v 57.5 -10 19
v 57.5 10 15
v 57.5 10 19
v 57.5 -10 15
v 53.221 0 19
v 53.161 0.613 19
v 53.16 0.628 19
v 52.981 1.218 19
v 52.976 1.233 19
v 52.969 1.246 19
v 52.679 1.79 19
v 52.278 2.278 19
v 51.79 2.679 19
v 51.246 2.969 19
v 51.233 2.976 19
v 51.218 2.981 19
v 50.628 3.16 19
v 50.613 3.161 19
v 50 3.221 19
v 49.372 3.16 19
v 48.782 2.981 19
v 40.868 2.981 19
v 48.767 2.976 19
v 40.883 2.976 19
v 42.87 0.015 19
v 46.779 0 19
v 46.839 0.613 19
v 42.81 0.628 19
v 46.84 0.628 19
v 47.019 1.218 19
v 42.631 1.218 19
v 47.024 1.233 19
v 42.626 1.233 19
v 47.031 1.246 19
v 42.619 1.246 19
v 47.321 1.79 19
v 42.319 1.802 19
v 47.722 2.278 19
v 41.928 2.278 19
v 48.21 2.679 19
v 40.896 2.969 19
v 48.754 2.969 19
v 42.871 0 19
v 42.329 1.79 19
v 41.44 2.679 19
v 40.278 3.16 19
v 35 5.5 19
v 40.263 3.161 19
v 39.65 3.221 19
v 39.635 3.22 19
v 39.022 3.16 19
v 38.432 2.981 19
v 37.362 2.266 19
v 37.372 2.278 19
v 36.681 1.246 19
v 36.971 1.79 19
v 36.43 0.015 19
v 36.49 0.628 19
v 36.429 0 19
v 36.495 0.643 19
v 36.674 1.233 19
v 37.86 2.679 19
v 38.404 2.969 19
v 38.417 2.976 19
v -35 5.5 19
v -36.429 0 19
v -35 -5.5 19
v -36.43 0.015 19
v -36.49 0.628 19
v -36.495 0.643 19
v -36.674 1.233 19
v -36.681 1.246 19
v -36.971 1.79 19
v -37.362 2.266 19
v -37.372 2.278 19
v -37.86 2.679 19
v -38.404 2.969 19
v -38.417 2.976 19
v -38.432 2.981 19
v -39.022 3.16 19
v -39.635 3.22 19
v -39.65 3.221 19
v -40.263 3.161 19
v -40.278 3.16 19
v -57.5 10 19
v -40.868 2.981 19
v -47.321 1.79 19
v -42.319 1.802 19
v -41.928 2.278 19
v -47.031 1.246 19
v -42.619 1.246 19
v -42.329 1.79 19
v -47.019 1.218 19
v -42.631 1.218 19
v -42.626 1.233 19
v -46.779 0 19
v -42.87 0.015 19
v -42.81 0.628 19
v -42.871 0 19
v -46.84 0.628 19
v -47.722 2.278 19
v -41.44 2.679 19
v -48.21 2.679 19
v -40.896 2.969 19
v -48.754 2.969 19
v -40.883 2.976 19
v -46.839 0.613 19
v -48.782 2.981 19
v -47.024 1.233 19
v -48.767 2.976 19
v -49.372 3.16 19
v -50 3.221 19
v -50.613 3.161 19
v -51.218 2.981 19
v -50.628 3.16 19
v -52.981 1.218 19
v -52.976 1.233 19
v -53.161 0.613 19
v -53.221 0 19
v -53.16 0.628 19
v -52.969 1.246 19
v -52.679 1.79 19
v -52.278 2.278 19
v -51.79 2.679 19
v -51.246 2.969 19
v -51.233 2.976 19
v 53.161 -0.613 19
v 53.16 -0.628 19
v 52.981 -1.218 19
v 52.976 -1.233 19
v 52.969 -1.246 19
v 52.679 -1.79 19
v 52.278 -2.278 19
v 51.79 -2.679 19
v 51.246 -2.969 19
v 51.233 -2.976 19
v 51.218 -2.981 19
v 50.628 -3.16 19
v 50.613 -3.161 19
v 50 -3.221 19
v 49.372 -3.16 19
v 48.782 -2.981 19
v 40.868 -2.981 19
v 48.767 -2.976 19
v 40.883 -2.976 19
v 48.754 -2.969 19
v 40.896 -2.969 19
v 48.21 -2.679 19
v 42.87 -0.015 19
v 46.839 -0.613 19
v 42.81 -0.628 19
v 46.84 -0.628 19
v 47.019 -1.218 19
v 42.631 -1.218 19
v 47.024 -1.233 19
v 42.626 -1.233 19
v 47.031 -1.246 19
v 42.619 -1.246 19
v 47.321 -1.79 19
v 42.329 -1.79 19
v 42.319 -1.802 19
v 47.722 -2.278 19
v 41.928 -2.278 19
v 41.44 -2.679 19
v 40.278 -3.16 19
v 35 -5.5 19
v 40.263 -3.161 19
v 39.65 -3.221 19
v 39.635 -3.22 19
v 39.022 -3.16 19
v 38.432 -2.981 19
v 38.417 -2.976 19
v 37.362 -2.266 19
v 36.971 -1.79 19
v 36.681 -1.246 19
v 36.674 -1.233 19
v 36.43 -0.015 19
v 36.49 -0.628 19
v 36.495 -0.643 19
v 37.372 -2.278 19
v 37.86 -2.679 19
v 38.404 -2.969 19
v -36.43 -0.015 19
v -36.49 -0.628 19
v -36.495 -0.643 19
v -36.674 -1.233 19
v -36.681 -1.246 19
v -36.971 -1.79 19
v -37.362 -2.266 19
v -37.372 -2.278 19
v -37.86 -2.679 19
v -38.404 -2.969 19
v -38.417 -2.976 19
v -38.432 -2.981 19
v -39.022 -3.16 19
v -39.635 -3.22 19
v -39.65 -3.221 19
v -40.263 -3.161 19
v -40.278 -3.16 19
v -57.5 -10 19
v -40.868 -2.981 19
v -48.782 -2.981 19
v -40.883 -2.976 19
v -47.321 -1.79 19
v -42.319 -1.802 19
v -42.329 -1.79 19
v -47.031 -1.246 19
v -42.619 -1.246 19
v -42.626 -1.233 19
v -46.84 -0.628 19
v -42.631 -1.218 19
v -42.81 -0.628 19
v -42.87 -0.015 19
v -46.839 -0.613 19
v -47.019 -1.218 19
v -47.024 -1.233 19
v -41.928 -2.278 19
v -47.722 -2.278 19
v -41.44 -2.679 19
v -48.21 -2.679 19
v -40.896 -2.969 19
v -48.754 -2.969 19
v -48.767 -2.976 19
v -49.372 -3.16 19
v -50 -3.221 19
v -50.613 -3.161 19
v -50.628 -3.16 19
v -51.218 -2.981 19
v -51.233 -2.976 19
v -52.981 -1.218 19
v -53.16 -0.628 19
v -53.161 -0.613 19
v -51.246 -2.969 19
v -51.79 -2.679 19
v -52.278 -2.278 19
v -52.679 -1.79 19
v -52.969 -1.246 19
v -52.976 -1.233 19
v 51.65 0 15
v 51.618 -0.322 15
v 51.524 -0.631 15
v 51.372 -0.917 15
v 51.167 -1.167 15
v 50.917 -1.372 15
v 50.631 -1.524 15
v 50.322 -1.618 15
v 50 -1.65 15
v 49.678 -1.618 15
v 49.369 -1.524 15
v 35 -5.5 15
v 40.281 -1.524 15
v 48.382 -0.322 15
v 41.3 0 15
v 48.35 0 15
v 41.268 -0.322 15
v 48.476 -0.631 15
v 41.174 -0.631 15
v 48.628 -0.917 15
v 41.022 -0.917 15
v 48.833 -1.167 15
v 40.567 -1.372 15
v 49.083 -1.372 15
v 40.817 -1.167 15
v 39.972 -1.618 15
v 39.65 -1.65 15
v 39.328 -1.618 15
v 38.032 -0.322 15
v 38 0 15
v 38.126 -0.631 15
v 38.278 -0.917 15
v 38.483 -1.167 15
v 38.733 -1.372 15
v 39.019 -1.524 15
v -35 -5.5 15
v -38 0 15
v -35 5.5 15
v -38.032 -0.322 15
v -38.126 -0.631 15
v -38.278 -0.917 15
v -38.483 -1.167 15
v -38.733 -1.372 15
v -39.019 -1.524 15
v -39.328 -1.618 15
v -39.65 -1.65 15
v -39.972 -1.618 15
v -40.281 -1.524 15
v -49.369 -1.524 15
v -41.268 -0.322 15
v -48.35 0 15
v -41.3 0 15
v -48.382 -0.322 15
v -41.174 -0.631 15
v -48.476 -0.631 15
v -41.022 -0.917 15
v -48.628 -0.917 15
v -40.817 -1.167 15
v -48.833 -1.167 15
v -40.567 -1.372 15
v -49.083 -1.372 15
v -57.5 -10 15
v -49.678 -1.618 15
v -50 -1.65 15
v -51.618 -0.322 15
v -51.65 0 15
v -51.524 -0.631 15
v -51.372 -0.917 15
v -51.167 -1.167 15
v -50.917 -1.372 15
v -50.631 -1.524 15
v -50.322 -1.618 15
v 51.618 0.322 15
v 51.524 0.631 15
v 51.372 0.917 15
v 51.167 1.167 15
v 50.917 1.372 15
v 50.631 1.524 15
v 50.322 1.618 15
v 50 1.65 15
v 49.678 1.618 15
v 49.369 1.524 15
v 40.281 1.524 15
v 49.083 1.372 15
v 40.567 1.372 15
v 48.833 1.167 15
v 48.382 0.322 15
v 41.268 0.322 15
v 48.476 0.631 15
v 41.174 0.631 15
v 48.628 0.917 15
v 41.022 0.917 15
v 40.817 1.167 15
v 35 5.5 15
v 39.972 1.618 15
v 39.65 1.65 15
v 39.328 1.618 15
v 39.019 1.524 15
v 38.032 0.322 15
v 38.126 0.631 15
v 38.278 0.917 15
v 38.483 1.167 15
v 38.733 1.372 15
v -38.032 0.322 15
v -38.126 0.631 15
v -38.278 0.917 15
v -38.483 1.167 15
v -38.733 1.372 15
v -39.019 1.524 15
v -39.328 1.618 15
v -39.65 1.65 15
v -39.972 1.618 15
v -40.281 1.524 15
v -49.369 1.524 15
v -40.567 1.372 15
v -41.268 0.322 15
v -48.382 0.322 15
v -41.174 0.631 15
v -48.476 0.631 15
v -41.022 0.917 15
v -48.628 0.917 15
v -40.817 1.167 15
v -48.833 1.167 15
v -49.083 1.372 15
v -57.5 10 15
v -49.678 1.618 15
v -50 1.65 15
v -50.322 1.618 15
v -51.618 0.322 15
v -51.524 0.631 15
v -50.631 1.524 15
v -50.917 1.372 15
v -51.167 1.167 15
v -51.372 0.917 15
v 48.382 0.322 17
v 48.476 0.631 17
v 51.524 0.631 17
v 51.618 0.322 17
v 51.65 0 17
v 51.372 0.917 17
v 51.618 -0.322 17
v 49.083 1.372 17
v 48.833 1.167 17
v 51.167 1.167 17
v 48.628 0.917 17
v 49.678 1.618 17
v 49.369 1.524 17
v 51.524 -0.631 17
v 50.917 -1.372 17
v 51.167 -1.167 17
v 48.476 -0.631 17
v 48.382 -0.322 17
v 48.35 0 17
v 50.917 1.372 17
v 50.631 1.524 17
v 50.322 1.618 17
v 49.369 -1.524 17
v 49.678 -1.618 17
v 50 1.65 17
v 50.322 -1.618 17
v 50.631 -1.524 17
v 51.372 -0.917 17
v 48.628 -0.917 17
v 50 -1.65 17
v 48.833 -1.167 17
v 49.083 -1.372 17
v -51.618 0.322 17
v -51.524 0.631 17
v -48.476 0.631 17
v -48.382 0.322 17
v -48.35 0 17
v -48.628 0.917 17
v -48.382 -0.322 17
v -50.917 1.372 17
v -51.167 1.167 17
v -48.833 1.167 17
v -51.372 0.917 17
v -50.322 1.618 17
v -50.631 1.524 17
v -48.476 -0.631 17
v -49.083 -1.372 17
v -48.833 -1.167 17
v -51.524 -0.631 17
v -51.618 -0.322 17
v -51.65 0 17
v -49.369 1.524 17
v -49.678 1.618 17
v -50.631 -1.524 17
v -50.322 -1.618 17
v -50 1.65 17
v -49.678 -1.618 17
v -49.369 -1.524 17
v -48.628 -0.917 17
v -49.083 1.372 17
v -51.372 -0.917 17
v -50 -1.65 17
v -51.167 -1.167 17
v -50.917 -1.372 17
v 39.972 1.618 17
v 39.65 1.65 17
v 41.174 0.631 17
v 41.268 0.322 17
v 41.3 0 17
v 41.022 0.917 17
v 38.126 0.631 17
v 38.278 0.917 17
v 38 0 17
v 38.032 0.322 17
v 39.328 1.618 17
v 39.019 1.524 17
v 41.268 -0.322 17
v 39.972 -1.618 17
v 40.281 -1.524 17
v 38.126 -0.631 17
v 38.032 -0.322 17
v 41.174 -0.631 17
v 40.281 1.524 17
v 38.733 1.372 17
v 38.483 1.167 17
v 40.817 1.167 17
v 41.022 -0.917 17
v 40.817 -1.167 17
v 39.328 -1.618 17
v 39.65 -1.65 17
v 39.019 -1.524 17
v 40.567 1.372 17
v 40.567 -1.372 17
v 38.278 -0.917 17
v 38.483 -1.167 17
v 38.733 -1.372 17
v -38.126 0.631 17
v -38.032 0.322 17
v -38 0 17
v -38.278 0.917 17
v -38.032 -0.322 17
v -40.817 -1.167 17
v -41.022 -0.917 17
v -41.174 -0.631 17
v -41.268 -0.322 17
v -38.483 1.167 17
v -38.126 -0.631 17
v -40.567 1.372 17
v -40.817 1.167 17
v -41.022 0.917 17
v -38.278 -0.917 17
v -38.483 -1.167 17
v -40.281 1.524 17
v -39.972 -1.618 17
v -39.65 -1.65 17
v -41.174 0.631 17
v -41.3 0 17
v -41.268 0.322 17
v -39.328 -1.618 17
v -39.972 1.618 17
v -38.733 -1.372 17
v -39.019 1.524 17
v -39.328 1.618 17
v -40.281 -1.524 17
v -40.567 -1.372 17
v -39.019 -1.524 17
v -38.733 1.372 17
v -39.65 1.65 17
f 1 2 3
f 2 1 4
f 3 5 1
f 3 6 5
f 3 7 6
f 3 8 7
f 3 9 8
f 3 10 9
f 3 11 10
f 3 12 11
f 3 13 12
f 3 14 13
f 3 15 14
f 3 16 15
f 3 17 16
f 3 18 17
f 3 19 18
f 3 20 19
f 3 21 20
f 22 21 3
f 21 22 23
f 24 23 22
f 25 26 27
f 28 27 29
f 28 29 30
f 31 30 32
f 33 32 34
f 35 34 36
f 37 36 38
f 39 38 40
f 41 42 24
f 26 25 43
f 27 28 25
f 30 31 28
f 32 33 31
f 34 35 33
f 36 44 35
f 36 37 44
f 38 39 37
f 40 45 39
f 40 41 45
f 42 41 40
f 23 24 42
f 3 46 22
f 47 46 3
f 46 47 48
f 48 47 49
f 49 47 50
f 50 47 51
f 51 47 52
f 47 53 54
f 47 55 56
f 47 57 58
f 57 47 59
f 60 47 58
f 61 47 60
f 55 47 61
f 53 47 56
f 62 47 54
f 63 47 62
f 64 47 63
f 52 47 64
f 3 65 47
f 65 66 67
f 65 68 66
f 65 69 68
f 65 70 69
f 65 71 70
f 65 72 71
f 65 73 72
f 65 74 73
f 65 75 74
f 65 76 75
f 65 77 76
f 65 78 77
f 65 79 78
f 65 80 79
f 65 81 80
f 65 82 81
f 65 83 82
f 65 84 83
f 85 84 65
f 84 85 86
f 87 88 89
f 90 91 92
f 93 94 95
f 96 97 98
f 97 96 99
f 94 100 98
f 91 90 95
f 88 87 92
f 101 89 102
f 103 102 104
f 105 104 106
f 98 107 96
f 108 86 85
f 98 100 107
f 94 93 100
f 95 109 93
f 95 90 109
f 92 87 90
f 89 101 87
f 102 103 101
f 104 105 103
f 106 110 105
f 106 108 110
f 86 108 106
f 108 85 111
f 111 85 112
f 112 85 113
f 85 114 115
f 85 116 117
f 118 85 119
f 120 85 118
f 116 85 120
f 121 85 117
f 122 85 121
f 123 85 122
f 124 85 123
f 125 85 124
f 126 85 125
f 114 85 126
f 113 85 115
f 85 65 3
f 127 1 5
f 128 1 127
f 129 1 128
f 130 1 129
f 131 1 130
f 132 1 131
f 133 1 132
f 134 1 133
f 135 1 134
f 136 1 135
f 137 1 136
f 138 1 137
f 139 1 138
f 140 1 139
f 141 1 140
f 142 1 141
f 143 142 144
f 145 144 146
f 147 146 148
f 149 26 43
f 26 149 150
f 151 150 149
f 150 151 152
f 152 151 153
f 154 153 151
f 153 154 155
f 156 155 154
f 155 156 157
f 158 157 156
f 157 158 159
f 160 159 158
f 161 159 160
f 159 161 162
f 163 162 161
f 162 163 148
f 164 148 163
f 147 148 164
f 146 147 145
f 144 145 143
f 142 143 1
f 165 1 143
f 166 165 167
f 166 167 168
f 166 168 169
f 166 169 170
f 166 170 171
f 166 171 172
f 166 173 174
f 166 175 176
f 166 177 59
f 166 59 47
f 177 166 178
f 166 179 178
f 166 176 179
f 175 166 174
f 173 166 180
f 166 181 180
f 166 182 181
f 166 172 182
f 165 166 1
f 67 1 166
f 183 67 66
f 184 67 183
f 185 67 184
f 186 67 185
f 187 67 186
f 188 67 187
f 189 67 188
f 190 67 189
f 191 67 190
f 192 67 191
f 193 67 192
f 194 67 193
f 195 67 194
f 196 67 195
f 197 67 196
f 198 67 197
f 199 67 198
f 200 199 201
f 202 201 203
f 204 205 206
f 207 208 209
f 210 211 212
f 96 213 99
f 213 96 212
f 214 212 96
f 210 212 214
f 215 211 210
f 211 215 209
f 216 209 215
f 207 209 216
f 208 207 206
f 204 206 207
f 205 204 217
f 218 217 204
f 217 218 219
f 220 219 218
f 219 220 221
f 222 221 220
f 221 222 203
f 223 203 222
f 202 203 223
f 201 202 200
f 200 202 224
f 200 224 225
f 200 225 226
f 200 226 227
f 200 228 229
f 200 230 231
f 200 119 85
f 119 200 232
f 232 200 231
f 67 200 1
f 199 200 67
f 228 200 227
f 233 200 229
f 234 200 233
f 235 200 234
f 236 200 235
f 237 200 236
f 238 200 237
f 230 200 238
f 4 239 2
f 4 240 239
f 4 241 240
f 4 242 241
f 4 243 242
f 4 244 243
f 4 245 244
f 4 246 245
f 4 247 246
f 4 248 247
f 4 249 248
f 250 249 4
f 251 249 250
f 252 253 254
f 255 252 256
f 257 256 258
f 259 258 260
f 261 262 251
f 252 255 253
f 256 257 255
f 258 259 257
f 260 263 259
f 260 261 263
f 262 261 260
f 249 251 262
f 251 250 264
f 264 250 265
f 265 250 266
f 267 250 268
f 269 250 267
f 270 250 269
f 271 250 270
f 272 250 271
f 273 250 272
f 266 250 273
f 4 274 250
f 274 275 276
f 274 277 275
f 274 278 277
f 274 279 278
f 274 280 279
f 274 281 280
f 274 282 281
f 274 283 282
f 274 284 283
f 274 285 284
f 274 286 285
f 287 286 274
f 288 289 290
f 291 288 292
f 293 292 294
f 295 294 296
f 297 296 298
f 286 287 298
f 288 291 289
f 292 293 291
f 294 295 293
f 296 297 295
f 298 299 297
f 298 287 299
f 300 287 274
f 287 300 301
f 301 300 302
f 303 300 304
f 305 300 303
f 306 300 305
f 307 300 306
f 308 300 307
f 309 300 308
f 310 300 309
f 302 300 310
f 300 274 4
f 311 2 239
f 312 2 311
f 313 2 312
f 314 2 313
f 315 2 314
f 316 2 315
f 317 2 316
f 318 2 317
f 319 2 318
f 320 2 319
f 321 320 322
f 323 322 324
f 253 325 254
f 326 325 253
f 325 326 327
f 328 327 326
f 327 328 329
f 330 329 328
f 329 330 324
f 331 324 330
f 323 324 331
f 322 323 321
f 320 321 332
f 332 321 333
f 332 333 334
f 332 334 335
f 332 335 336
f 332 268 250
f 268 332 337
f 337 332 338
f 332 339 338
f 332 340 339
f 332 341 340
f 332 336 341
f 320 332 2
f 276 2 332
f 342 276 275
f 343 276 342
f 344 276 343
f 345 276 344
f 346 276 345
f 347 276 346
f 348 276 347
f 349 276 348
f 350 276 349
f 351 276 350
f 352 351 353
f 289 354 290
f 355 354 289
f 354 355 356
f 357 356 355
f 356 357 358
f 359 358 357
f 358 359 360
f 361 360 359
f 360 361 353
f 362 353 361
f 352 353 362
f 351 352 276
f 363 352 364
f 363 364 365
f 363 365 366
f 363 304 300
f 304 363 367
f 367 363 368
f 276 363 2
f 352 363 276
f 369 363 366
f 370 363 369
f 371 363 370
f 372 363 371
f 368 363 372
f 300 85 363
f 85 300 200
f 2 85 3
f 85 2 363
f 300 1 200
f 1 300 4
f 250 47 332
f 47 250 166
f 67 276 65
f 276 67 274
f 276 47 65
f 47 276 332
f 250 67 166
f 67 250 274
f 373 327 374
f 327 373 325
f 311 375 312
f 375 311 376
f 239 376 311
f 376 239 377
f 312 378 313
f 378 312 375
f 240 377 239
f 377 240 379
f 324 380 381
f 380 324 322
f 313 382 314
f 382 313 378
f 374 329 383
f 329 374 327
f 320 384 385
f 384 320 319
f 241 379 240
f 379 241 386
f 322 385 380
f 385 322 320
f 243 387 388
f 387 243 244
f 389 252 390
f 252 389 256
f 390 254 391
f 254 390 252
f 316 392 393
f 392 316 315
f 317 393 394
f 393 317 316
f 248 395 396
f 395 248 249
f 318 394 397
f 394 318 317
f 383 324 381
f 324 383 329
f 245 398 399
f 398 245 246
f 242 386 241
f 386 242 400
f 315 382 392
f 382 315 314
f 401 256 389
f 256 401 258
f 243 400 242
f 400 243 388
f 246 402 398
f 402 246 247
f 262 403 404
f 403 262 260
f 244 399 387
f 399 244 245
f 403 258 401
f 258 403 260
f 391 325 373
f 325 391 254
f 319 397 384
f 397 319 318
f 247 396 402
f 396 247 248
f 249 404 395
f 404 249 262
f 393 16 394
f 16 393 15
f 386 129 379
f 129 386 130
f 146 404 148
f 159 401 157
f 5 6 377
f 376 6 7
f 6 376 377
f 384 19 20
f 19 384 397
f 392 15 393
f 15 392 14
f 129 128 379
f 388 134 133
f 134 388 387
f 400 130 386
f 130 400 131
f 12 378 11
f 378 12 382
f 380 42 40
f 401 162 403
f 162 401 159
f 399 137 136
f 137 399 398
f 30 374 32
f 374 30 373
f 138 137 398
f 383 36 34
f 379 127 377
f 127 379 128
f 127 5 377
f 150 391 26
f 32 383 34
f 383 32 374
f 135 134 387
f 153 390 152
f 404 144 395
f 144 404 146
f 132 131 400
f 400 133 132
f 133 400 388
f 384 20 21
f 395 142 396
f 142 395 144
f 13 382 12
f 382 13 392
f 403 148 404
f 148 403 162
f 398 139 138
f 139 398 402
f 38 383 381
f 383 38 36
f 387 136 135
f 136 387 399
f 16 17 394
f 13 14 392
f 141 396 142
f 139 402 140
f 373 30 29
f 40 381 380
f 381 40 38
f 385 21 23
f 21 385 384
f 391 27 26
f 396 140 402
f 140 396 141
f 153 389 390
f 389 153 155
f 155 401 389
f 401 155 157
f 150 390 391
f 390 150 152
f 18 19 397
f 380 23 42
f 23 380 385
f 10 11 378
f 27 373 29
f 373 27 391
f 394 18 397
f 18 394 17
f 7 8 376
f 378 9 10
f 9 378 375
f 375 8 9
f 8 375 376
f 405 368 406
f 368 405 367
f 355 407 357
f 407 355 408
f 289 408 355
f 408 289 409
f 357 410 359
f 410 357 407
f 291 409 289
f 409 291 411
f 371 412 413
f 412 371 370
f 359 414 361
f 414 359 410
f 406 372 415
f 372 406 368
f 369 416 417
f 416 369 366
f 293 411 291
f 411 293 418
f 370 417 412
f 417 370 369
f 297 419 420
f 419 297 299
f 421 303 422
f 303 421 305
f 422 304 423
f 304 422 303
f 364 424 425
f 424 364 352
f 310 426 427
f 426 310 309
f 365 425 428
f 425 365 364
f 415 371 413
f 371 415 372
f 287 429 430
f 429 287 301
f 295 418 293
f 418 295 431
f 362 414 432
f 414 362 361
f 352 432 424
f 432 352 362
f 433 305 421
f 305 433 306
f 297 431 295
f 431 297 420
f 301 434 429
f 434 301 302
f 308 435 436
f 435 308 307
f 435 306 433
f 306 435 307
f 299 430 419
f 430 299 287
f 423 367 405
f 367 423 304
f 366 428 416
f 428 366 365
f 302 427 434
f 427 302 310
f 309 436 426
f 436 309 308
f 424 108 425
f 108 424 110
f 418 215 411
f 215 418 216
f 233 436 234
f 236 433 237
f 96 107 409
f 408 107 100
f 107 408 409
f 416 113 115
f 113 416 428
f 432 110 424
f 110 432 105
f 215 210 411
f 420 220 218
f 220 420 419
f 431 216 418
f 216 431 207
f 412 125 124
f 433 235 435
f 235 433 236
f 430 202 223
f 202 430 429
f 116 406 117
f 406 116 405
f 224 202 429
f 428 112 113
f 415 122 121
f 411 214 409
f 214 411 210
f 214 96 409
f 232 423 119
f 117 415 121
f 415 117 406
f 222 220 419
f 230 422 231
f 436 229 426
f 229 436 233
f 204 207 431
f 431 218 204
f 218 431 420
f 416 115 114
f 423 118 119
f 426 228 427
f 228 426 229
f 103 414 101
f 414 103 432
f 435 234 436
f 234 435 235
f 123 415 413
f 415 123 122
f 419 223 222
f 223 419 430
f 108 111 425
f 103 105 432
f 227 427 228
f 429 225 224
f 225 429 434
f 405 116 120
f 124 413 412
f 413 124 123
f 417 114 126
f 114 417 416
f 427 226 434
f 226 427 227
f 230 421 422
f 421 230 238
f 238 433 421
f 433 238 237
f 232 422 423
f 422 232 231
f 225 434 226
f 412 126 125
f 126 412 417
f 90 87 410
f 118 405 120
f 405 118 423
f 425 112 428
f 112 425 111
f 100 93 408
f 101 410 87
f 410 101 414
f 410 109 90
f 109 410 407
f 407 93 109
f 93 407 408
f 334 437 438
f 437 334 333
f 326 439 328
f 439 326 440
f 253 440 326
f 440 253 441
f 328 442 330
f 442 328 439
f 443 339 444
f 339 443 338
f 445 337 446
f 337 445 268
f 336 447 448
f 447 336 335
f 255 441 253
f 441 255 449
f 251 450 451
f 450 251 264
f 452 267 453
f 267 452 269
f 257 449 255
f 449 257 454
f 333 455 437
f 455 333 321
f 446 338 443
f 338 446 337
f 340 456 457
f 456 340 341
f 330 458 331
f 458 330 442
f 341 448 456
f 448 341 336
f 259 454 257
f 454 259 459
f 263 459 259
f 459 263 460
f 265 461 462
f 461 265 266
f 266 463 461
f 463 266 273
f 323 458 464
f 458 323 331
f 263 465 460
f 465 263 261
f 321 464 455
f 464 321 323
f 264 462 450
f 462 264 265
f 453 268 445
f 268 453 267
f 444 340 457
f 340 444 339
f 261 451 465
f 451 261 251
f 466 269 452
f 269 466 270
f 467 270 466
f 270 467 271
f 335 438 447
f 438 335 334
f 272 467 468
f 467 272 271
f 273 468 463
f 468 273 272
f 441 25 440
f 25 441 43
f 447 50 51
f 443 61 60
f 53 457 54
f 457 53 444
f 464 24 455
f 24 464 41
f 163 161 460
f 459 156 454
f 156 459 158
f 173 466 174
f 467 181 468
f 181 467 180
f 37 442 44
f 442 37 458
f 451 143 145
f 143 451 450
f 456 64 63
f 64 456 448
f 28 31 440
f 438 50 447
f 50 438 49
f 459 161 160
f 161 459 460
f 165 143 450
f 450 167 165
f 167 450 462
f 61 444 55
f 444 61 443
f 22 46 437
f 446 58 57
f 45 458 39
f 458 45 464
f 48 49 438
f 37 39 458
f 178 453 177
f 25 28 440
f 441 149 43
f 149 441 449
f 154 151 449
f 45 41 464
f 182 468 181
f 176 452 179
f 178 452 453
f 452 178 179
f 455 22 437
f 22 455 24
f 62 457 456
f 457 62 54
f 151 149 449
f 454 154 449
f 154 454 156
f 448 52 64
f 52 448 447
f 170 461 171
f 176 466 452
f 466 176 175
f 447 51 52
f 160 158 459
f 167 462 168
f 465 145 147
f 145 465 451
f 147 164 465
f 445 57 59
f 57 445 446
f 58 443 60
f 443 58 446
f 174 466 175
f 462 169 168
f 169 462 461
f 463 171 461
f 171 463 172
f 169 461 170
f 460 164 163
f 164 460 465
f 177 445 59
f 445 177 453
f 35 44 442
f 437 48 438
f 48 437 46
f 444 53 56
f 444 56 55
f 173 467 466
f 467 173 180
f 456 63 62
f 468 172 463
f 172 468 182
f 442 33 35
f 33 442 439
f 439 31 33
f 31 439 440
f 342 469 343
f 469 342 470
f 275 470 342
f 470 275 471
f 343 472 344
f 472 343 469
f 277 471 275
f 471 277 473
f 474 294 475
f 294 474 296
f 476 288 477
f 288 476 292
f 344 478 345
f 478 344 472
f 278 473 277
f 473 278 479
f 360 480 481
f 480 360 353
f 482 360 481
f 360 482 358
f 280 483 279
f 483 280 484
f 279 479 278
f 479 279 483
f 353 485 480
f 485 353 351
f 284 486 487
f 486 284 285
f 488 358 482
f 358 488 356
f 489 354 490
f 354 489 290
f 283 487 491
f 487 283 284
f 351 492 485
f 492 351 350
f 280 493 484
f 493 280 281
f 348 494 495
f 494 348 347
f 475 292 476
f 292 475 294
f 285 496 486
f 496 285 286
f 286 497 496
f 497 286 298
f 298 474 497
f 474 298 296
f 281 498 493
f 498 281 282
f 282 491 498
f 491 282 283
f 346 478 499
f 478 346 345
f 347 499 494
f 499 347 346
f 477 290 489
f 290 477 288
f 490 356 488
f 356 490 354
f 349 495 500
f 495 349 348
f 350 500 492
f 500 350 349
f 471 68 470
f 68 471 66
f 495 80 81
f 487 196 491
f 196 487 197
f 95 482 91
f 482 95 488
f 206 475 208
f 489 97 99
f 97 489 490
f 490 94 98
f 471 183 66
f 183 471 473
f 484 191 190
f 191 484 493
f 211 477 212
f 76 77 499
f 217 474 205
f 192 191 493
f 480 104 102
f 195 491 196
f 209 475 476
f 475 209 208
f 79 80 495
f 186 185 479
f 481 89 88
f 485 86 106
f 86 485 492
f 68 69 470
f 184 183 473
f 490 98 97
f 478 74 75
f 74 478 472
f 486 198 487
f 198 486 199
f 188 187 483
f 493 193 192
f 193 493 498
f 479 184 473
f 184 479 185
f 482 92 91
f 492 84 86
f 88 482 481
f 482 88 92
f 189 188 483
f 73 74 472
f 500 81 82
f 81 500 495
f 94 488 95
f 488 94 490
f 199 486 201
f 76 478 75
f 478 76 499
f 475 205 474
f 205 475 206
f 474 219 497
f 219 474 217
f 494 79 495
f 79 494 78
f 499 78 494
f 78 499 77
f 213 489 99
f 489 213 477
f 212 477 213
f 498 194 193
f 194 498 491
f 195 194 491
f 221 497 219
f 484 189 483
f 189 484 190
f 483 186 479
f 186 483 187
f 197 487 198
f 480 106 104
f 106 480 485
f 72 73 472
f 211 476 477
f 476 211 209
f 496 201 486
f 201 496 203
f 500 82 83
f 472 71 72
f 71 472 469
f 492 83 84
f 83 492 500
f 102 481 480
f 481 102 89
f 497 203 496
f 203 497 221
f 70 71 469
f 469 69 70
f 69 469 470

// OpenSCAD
// file: parameter.scad
nStrings=6;
nFrets=24;
nLedFrets=16;
m5Dia=5.3;
m5HeadZ=3.5;
m4Dia=4.3;
m4NutDia=8.3;
m4NutZ=3.5;
m4HeadZ=2.5;
m3Dia=3.3;
m3NutDia=6.6;
m3NutZ=2.5;
m3HeadZ=2;
strDistN=7;
strDistB=10.25;
scale=645;
neckSlotY=500;

slotXY=15;

bodySlotX=115;
bodySlotY=250;

jackYA=40;
jackYB=54;
jackZA=20;
jackZB=25;

bodyX=300;

bodyZ=40;

strDia=[1.7,1.4,1.1,0.7,0.5,0.35];

fretStrPlus=4;
fretLN=strDistN*(nStrings-1)+fretStrPlus*2;
fretLB=strDistB*(nStrings-1)+fretStrPlus*2;
strSpanB=strDistB*(nStrings-1);
strSpanN=strDistN*(nStrings-1);
fretBtmZ=1;
neckSlotX=fretLN;
neckSlotDist=neckSlotX-slotXY*2;

neck_sideT=5.5; //thicknes of the neck side locks
neck_bottomT=2.5;

neck_mntPosYA=447;
neck_mntPosYB=420;
neck_mntEndT=2.5;
neck_lastFretSpc=13;

nut_slotSink=6;

//fretY=16;
fretPcbZ=1.6;
fretDia=3.5;
fretZ=1.5;
fretOvrZ=4;
fretboardZ=fretOvrZ+fretPcbZ;



L=scale;
k=1.05946;

fretPos1=scale-(scale/pow(k,4));

function fretPos(i)=L-(L/pow(k,i));
function fretSpc(i)=(L/pow(k,i))-(L/pow(k,i+1));
function strSpc(i)=i/L*strDistB+(1-i/L)*strDistN;
function fretL(i)=(i/L*strDistB+(1-i/L)*strDistN)*(nStrings-1)+fretStrPlus*2;

echo (70-(fretL(fretPos(1))));
// main file
include <parameter.scad>;
$fn=32;
rotate([0,0,0])hexPickup(2);
pY=10;
pX=69;
pBtmZ=6;
pZA=5;
mYO=20;
mX=bodySlotX;
mXI=bodySlotX-slotXY*2;
mZ=4;
pScrwD=mXI-m3Dia-2.4;
pZ=slotXY+mZ;
pMDist=0.5;
coilZ=4.5;
coilX=7;
coilsX=67;
coilsY=7;
coilY=6.5;
coilDist=10.4;
coilSpan=nStrings*(coilDist-1);

module hexPickup(part){
if(part==1||part==0)pickup();
if(part==-1)rotate([180,0,0])pickup();

if(part==2||part==0)mount();

if(part==3||part==0)translate([0,0,-coilZ])rotate([0,0,0])coilPress();

module mount(){
difference(){
translate([-mX/2,-mYO/2,slotXY])cube([mX,mYO,mZ]);
translate([-pX/2-pMDist,-pY/2-pMDist,slotXY])cube([pX+pMDist*2,pY+pMDist*2,mZ+1]);

translate([bodySlotX/2-slotXY/2,0,slotXY])cylinder(d=m3Dia,h=mZ*2);
translate([bodySlotX/2-slotXY/2,0,slotXY+mZ-m3HeadZ])cylinder(d1=m3Dia,d2=m3Dia*2,h=m3HeadZ+0.1);

translate([-(bodySlotX/2-slotXY/2),0,slotXY])cylinder(d=m3Dia,h=mZ*2);
translate([-(bodySlotX/2-slotXY/2),0,slotXY+mZ-m3HeadZ])cylinder(d1=m3Dia,d2=m3Dia*2,h=m3HeadZ+0.1);

translate([pScrwD/2,0,slotXY])cylinder(d=m3Dia,h=mZ*2);
translate([pScrwD/2,0,slotXY+mZ-m3HeadZ])cylinder(d1=m3Dia,d2=m3Dia*2,h=m3HeadZ+0.1);

translate([-pScrwD/2,0,slotXY])cylinder(d=m3Dia,h=mZ*2);
translate([-pScrwD/2,0,slotXY+mZ-m3HeadZ])cylinder(d1=m3Dia,d2=m3Dia*2,h=m3HeadZ+0.1);
}
}

module pickup(){
difference(){
union(){
translate([-pX/2,-pY/2,0])cube([pX,pY,pZ]);
translate([-(bodySlotX/2-slotXY),-pY/2,0])cube([bodySlotX-slotXY*2,pY,pBtmZ]);
}

translate([-coilsX/2,-coilsY/2,0-2])cube([coilsX,coilsY,pZ]);


translate([pScrwD/2,0,0])cylinder(d=2.8,h=mZ*2);
translate([-pScrwD/2,0,0])cylinder(d=2.8,h=mZ*2);

translate([0,pY,m3Dia*1.5])rotate([90,0,0])cylinder(d=m3Dia,h=pY*2);

for(i=[0:nStrings-1]){
translate([i*coilDist-coilX/2-coilDist*2.5,0,0]){
translate([0,-coilY/2,0])cube([coilX,coilY,pZ+2]);

}}


}



}

module coilPress(){
xA=coilsX-7;
y=coilsY-1;
cableDia=4;
difference(){
union(){
hull(){
translate([-xA/2,-y/2,pZ-2])cube([xA,y,2]);
translate([-m3Dia*1.5,-y/2,10])cube([m3Dia*3,y,2]);
}
translate([-m3Dia*1.5,-y/2,0])cube([m3Dia*3,y,10]);
}
hull(){
translate([0,pY,11])rotate([90,0,0])cylinder(d=m3Dia,h=pY*2);
translate([0,pY,0])rotate([90,0,0])cylinder(d=m3Dia,h=pY*2);
}
hull(){
translate([-pX/2,y/2,15])rotate([90,0,90])cylinder(d=cableDia,h=pX);
translate([-pX/2,y/2-cableDia/2,15])rotate([90,0,90])cylinder(d=cableDia,h=pX);
}
}
}

}

module zAdj(){
z=3;
$fn=6;
difference(){
cylinder(d=20,h=z);
cylinder(d=8.1,h=z);

}
}
//zAdj();
